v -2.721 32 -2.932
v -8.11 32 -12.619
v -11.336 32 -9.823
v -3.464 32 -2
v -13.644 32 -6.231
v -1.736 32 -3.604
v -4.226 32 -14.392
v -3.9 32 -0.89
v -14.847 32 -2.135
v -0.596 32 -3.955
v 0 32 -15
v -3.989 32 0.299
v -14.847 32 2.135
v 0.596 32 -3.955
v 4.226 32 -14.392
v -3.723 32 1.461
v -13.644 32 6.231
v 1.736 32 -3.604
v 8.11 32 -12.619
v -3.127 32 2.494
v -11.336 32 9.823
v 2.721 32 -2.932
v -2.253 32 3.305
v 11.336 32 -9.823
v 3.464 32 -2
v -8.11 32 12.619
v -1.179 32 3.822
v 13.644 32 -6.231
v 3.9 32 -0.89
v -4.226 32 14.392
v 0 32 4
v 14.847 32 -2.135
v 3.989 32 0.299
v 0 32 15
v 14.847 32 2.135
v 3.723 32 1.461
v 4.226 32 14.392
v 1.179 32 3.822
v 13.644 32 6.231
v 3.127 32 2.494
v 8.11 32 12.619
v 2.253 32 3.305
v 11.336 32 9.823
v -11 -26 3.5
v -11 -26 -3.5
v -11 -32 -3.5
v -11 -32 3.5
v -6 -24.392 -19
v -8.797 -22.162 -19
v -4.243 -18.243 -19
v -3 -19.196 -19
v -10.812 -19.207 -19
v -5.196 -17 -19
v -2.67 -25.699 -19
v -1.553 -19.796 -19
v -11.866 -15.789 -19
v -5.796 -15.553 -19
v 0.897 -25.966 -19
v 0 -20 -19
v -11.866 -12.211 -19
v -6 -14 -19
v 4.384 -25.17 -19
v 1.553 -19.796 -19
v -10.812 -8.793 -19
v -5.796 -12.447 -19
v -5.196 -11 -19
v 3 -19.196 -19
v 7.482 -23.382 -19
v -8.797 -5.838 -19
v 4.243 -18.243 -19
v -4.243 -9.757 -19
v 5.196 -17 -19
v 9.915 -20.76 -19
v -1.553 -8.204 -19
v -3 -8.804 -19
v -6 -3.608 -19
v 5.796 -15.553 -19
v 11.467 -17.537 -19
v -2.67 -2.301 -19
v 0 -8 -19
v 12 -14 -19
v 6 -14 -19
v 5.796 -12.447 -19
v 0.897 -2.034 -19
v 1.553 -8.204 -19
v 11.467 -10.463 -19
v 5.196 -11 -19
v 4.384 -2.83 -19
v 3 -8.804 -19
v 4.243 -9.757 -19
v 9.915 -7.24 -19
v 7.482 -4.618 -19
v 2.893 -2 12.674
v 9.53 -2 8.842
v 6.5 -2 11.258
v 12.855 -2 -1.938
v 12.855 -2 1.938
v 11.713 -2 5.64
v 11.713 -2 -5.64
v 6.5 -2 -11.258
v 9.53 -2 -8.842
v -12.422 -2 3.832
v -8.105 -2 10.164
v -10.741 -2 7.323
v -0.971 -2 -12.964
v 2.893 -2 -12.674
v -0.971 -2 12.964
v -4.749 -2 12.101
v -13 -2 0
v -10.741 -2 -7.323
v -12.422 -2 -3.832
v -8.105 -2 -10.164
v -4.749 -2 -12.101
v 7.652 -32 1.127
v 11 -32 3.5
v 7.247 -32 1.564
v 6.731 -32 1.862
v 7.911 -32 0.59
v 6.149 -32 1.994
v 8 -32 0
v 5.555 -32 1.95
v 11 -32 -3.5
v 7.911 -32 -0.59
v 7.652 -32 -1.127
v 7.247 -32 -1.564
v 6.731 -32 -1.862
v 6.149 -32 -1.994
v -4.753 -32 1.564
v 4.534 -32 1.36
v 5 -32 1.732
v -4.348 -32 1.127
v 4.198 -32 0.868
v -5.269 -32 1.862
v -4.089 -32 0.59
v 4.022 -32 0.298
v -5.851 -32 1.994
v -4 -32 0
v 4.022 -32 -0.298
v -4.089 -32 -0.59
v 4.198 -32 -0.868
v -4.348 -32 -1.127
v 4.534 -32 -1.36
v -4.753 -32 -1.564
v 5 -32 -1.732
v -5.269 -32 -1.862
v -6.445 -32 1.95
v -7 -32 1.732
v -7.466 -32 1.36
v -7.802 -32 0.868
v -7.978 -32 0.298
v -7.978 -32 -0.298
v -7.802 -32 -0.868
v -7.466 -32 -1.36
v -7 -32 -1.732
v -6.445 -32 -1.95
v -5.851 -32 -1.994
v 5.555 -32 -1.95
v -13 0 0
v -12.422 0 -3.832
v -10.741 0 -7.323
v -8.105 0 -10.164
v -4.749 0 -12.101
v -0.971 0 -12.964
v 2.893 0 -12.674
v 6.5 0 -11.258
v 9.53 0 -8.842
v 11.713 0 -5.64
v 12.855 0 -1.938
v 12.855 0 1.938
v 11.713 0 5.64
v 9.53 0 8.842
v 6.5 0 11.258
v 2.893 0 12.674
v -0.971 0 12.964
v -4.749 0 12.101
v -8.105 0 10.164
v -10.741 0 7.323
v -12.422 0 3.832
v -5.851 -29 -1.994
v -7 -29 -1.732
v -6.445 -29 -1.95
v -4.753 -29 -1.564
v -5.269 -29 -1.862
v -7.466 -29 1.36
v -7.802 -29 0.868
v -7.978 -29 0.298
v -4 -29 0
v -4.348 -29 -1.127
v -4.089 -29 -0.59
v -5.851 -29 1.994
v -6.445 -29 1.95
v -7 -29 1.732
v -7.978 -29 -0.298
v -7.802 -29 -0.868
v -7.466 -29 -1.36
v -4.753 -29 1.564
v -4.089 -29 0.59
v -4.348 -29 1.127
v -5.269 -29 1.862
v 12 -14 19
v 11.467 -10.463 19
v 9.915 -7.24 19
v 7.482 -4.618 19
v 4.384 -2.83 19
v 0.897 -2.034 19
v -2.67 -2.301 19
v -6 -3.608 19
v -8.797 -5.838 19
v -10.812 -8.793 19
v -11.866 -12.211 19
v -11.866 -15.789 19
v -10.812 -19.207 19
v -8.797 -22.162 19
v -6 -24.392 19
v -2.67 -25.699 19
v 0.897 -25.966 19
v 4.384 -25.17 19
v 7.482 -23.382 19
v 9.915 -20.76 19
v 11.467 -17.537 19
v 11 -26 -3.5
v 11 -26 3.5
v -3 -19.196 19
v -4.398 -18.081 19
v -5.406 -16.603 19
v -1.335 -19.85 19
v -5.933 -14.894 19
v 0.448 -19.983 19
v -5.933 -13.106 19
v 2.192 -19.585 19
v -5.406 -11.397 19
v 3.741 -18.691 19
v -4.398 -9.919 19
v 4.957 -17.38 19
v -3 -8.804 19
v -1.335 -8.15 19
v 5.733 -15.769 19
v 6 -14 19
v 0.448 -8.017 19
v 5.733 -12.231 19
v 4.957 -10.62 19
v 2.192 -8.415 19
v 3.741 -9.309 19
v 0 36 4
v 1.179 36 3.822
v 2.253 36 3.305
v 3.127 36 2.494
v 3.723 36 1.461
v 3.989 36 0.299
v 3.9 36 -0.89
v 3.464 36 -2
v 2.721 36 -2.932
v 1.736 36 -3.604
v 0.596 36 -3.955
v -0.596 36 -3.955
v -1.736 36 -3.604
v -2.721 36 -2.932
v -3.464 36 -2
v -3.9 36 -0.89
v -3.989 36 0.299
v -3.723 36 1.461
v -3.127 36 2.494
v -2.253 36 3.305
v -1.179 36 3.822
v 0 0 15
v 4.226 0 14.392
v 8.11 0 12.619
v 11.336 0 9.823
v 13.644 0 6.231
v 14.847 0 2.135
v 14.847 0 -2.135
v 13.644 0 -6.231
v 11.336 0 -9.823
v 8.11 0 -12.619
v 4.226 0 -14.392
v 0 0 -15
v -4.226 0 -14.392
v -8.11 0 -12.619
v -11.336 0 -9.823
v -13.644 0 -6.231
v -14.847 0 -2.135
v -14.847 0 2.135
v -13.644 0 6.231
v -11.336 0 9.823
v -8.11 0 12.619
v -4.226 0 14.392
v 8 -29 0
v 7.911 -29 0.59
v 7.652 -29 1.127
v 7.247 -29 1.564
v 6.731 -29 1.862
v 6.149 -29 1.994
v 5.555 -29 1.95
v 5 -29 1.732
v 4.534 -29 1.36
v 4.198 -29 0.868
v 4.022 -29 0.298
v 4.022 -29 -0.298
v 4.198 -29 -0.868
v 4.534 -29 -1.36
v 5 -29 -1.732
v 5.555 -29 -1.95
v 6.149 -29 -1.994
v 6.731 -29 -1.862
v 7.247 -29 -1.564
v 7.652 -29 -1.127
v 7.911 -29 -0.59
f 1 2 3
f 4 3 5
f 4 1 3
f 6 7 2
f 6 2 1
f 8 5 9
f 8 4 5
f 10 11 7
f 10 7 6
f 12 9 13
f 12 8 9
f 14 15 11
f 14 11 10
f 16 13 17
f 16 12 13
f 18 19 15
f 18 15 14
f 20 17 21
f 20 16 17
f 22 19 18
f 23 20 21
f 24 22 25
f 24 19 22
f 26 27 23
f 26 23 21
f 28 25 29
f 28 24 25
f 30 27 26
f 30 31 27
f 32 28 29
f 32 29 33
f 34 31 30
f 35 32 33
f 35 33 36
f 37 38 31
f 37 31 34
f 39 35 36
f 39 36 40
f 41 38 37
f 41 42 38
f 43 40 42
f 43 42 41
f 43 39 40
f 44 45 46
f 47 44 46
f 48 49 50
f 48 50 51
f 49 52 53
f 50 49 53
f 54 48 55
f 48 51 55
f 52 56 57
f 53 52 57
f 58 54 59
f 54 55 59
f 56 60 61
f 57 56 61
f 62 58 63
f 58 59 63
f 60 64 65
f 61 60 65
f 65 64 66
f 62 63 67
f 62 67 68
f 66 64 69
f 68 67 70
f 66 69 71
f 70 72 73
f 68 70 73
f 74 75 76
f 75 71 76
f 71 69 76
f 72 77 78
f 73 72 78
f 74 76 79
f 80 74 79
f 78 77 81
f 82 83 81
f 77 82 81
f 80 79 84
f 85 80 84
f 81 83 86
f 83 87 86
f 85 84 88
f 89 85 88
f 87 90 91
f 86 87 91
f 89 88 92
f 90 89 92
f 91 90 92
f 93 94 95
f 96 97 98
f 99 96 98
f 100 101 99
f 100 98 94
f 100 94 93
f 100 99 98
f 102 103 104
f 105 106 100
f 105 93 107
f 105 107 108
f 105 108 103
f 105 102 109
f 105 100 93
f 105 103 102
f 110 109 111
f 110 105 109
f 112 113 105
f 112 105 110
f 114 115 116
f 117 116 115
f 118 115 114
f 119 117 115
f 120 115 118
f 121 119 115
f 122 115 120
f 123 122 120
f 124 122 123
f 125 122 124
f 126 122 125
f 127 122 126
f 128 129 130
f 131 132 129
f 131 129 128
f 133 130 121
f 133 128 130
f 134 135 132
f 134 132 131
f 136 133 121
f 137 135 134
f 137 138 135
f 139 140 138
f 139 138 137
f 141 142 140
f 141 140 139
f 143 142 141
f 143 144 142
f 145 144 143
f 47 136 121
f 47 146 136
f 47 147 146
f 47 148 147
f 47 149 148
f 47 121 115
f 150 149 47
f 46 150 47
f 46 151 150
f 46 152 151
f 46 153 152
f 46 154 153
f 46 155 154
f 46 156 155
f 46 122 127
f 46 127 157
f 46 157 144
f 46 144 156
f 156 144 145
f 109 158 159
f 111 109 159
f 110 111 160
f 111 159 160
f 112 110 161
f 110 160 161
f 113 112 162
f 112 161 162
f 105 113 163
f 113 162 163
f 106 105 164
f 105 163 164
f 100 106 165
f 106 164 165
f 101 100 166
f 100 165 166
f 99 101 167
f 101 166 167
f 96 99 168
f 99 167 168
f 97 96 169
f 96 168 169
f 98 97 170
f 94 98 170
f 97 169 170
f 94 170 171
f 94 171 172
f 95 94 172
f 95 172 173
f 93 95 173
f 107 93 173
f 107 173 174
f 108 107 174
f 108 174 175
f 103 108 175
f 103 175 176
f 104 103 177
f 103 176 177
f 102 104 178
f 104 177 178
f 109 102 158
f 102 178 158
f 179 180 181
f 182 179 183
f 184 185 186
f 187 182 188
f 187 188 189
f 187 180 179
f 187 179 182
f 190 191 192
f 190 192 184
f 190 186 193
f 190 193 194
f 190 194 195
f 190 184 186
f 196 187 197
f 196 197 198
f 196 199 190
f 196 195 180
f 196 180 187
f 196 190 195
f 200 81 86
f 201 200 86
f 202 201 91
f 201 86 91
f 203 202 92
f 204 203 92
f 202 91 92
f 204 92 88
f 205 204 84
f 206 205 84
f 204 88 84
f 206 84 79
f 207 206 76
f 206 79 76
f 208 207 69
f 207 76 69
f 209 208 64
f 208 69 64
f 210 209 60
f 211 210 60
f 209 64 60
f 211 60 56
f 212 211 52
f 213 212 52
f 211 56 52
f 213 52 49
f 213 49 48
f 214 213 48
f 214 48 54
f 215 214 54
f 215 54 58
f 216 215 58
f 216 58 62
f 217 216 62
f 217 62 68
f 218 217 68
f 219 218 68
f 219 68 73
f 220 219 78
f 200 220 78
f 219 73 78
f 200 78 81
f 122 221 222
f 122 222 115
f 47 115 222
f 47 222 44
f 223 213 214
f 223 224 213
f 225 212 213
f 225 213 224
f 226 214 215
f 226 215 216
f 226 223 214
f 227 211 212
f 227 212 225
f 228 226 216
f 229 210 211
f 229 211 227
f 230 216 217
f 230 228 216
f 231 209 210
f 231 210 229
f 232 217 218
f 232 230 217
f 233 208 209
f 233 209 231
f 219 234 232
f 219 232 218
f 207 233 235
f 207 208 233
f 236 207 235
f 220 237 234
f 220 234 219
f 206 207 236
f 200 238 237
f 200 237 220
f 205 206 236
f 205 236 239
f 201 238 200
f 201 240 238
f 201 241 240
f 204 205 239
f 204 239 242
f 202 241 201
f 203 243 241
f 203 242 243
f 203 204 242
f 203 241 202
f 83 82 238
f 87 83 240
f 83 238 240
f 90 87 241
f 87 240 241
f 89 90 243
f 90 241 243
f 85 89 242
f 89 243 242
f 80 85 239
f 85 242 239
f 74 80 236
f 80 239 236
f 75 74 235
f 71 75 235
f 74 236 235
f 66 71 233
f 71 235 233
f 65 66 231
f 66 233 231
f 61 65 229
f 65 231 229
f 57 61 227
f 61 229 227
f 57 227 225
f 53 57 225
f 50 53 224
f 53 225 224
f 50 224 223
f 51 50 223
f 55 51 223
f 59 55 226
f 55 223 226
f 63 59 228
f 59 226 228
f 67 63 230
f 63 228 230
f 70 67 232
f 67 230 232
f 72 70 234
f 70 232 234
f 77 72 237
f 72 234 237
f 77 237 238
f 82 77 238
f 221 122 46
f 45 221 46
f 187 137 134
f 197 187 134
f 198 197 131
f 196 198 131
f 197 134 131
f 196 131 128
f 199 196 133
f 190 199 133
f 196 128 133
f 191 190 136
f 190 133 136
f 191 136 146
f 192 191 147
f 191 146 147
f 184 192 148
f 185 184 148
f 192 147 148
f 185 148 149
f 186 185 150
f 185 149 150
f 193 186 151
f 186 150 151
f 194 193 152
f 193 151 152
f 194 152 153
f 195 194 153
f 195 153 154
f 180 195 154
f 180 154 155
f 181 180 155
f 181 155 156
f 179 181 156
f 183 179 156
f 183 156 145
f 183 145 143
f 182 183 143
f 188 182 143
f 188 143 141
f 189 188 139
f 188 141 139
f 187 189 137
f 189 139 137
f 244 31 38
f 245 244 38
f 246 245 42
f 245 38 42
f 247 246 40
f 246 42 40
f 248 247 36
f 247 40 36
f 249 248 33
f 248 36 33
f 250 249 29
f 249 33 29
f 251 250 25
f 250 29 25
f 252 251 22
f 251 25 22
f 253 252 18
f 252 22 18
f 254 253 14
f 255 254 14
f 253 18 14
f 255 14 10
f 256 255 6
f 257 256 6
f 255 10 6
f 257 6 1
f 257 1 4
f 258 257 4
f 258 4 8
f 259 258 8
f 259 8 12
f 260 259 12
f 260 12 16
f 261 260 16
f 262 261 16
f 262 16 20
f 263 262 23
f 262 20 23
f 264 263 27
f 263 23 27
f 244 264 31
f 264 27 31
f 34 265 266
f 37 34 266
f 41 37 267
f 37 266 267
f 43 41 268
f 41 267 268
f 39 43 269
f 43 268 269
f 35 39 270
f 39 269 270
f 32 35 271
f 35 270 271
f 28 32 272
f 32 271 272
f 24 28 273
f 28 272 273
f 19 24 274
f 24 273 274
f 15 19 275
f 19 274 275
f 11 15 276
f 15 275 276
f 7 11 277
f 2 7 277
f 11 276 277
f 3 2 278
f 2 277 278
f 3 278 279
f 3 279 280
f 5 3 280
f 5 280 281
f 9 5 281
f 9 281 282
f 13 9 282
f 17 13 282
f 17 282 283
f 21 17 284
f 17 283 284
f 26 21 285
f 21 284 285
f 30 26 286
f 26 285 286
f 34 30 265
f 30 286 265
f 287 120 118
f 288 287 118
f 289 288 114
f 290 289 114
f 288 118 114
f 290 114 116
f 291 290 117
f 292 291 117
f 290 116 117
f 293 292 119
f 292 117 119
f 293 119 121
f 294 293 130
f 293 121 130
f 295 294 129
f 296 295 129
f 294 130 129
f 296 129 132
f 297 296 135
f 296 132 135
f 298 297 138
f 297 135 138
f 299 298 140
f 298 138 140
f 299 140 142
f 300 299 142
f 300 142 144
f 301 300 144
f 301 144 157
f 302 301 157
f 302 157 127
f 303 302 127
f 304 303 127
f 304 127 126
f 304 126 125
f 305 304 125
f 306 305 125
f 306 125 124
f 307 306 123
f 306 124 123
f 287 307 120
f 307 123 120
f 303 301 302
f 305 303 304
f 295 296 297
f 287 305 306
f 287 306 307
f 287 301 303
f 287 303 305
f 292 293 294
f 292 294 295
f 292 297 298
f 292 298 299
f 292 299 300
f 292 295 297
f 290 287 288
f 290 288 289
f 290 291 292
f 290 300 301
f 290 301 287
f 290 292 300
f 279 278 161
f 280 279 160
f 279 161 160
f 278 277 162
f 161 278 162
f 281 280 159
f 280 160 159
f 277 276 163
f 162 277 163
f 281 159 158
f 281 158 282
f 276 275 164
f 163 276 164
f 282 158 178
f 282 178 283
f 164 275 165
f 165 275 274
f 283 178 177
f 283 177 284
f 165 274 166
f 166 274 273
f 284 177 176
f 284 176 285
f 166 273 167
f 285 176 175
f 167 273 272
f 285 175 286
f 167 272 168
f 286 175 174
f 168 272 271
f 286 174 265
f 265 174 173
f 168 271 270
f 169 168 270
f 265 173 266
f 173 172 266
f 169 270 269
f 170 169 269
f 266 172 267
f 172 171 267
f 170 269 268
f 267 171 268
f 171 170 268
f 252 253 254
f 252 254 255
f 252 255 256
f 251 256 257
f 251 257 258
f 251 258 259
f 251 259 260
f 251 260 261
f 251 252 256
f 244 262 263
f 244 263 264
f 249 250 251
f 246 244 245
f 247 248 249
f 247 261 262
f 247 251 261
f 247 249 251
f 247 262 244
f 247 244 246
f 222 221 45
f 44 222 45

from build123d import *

# Parameters (mm, degrees)
SKETCH2_R                = 15
BOSS_EXTRUDE1_DEPTH      = 32
SKETCH3_R                = 4
BOSS_EXTRUDE2_DEPTH      = 4
SKETCH4_R                = 13
BOSS_EXTRUDE3_DEPTH      = 2
BOSS_EXTRUDE4_DEPTH      = 19
BOSS_EXTRUDE4_DEPTH_BACK = 19
SKETCH10_R               = 6
CUT_EXTRUDE1_DEPTH       = 44.382023927
SKETCH12_R               = 6
CUT_EXTRUDE2_DEPTH       = 55.45181356
BOSS_EXTRUDE5_DEPTH      = 3.5
BOSS_EXTRUDE5_DEPTH_BACK = 3.5
SKETCH14_R               = 2
CUT_EXTRUDE3_DEPTH       = 3
SKETCH16_R               = 2
CUT_EXTRUDE4_DEPTH       = 3


with BuildPart() as part:
    # Sketch2 → Boss-Extrude1 (new body)
    with BuildSketch(Plane(origin=(0, 0, 0), x_dir=(1, 0, 0), z_dir=(0, 1, 0))):
        Circle(SKETCH2_R)
    extrude(amount=BOSS_EXTRUDE1_DEPTH)

    # Sketch3 → Boss-Extrude2 (add)
    with BuildSketch(Plane(origin=(0, 32, 0), x_dir=(1, 0, 0), z_dir=(0, 1, 0))):
        Circle(SKETCH3_R)
    extrude(amount=BOSS_EXTRUDE2_DEPTH)

    # Sketch4 → Boss-Extrude3 (add)
    with BuildSketch(Plane(origin=(0, 0, 0), x_dir=(-1, 0, 0), z_dir=(0, -1, 0))):
        Circle(SKETCH4_R)
    extrude(amount=BOSS_EXTRUDE3_DEPTH)


with BuildPart() as body_2:
    # Sketch6 → Boss-Extrude4 (new, two sides: drawn at the far end of the back side and taken through both)
    with BuildSketch(Plane(origin=(0, 0, 0), x_dir=(-1, 0, 0), z_dir=(0, 0, 1)).offset(-BOSS_EXTRUDE4_DEPTH_BACK)):
        with BuildLine():
            ThreePointArc((0, 2), (8.485281374, 5.514718626), (12, 14))
            ThreePointArc((12, 14), (-8.485281374, 22.485281374), (0, 2))
        make_face()
    extrude(amount=BOSS_EXTRUDE4_DEPTH + BOSS_EXTRUDE4_DEPTH_BACK)

    # Sketch10 → Cut-Extrude1 (cut, through all)
    with BuildSketch(Plane(origin=(0, 0, 0), x_dir=(-1, 0, 0), z_dir=(0, 0, 1))):
        with Locations((0, 14)):
            Circle(SKETCH10_R)
    extrude(amount=-CUT_EXTRUDE1_DEPTH, mode=Mode.SUBTRACT)

    # Sketch12 → Cut-Extrude2 (cut, through all)
    with BuildSketch(Plane.XY.offset(19)):
        with Locations((0, -14)):
            Circle(SKETCH12_R)
    extrude(amount=-CUT_EXTRUDE2_DEPTH, mode=Mode.SUBTRACT)


with BuildPart() as body_3:
    # Sketch13 → Boss-Extrude5 (new, two sides: drawn at the far end of the back side and taken through both)
    with BuildSketch(Plane(origin=(0, 0, 0), x_dir=(-1, 0, 0), z_dir=(0, 0, 1)).offset(-BOSS_EXTRUDE5_DEPTH_BACK)):
        Polygon((11, 26), (11, 32), (-11, 32), (-11, 26), (0, 26), align=None)
    extrude(amount=BOSS_EXTRUDE5_DEPTH + BOSS_EXTRUDE5_DEPTH_BACK)

    # Sketch14 → Cut-Extrude3 (cut)
    with BuildSketch(Plane(origin=(0, -32, 0), x_dir=(-1, 0, 0), z_dir=(0, -1, 0))):
        with Locations((-6, 0)):
            Circle(SKETCH14_R)
    extrude(amount=-CUT_EXTRUDE3_DEPTH, mode=Mode.SUBTRACT)

    # Sketch16 → Cut-Extrude4 (cut)
    with BuildSketch(Plane(origin=(0, -32, 0), x_dir=(-1, 0, 0), z_dir=(0, -1, 0))):
        with Locations((6, 0)):
            Circle(SKETCH16_R)
    extrude(amount=-CUT_EXTRUDE4_DEPTH, mode=Mode.SUBTRACT)


solid = Compound([part.part, body_2.part, body_3.part])
